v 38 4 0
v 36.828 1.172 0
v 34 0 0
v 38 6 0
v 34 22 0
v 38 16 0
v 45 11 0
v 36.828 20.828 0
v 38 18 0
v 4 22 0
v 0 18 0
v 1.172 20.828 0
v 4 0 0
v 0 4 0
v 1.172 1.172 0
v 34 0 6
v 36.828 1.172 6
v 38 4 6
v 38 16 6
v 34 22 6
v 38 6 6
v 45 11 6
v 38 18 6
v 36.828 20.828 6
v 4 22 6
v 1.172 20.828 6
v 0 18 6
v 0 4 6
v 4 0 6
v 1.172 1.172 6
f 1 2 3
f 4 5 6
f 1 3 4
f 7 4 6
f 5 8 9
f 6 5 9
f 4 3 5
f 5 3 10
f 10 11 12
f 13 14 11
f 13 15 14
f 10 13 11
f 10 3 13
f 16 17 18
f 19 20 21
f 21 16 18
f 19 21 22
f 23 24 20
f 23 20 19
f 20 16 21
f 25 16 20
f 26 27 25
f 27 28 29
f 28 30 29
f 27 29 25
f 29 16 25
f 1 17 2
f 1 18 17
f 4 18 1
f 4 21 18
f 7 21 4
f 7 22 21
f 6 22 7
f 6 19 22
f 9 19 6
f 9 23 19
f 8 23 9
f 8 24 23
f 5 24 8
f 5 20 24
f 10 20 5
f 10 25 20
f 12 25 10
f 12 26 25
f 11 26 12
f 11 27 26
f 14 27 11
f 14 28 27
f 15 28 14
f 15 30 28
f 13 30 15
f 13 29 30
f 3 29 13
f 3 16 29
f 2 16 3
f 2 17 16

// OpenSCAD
$fn = 32;

// ----------------------------------------------------------------------
// Ratchet pawl: 38 x 22 mm body, beak 7 mm с правого торца
// ----------------------------------------------------------------------

// --- parameters (mm) ---
profile_height = 6;       // extrusion height
profile_points = 15;      // points of the closed outline

profile = [[0, 4], [1.172, 1.172], [4, 0], [34, 0], [36.828, 1.172], [38, 4], [38, 6], [45, 11], [38, 16], [38, 18], [36.828, 20.828], [34, 22], [4, 22], [1.172, 20.828], [0, 18]];  // single closed polygon, 15 points, counter clockwise

// --- the one profile operation ---
linear_extrude(height = profile_height) polygon(points = profile);
